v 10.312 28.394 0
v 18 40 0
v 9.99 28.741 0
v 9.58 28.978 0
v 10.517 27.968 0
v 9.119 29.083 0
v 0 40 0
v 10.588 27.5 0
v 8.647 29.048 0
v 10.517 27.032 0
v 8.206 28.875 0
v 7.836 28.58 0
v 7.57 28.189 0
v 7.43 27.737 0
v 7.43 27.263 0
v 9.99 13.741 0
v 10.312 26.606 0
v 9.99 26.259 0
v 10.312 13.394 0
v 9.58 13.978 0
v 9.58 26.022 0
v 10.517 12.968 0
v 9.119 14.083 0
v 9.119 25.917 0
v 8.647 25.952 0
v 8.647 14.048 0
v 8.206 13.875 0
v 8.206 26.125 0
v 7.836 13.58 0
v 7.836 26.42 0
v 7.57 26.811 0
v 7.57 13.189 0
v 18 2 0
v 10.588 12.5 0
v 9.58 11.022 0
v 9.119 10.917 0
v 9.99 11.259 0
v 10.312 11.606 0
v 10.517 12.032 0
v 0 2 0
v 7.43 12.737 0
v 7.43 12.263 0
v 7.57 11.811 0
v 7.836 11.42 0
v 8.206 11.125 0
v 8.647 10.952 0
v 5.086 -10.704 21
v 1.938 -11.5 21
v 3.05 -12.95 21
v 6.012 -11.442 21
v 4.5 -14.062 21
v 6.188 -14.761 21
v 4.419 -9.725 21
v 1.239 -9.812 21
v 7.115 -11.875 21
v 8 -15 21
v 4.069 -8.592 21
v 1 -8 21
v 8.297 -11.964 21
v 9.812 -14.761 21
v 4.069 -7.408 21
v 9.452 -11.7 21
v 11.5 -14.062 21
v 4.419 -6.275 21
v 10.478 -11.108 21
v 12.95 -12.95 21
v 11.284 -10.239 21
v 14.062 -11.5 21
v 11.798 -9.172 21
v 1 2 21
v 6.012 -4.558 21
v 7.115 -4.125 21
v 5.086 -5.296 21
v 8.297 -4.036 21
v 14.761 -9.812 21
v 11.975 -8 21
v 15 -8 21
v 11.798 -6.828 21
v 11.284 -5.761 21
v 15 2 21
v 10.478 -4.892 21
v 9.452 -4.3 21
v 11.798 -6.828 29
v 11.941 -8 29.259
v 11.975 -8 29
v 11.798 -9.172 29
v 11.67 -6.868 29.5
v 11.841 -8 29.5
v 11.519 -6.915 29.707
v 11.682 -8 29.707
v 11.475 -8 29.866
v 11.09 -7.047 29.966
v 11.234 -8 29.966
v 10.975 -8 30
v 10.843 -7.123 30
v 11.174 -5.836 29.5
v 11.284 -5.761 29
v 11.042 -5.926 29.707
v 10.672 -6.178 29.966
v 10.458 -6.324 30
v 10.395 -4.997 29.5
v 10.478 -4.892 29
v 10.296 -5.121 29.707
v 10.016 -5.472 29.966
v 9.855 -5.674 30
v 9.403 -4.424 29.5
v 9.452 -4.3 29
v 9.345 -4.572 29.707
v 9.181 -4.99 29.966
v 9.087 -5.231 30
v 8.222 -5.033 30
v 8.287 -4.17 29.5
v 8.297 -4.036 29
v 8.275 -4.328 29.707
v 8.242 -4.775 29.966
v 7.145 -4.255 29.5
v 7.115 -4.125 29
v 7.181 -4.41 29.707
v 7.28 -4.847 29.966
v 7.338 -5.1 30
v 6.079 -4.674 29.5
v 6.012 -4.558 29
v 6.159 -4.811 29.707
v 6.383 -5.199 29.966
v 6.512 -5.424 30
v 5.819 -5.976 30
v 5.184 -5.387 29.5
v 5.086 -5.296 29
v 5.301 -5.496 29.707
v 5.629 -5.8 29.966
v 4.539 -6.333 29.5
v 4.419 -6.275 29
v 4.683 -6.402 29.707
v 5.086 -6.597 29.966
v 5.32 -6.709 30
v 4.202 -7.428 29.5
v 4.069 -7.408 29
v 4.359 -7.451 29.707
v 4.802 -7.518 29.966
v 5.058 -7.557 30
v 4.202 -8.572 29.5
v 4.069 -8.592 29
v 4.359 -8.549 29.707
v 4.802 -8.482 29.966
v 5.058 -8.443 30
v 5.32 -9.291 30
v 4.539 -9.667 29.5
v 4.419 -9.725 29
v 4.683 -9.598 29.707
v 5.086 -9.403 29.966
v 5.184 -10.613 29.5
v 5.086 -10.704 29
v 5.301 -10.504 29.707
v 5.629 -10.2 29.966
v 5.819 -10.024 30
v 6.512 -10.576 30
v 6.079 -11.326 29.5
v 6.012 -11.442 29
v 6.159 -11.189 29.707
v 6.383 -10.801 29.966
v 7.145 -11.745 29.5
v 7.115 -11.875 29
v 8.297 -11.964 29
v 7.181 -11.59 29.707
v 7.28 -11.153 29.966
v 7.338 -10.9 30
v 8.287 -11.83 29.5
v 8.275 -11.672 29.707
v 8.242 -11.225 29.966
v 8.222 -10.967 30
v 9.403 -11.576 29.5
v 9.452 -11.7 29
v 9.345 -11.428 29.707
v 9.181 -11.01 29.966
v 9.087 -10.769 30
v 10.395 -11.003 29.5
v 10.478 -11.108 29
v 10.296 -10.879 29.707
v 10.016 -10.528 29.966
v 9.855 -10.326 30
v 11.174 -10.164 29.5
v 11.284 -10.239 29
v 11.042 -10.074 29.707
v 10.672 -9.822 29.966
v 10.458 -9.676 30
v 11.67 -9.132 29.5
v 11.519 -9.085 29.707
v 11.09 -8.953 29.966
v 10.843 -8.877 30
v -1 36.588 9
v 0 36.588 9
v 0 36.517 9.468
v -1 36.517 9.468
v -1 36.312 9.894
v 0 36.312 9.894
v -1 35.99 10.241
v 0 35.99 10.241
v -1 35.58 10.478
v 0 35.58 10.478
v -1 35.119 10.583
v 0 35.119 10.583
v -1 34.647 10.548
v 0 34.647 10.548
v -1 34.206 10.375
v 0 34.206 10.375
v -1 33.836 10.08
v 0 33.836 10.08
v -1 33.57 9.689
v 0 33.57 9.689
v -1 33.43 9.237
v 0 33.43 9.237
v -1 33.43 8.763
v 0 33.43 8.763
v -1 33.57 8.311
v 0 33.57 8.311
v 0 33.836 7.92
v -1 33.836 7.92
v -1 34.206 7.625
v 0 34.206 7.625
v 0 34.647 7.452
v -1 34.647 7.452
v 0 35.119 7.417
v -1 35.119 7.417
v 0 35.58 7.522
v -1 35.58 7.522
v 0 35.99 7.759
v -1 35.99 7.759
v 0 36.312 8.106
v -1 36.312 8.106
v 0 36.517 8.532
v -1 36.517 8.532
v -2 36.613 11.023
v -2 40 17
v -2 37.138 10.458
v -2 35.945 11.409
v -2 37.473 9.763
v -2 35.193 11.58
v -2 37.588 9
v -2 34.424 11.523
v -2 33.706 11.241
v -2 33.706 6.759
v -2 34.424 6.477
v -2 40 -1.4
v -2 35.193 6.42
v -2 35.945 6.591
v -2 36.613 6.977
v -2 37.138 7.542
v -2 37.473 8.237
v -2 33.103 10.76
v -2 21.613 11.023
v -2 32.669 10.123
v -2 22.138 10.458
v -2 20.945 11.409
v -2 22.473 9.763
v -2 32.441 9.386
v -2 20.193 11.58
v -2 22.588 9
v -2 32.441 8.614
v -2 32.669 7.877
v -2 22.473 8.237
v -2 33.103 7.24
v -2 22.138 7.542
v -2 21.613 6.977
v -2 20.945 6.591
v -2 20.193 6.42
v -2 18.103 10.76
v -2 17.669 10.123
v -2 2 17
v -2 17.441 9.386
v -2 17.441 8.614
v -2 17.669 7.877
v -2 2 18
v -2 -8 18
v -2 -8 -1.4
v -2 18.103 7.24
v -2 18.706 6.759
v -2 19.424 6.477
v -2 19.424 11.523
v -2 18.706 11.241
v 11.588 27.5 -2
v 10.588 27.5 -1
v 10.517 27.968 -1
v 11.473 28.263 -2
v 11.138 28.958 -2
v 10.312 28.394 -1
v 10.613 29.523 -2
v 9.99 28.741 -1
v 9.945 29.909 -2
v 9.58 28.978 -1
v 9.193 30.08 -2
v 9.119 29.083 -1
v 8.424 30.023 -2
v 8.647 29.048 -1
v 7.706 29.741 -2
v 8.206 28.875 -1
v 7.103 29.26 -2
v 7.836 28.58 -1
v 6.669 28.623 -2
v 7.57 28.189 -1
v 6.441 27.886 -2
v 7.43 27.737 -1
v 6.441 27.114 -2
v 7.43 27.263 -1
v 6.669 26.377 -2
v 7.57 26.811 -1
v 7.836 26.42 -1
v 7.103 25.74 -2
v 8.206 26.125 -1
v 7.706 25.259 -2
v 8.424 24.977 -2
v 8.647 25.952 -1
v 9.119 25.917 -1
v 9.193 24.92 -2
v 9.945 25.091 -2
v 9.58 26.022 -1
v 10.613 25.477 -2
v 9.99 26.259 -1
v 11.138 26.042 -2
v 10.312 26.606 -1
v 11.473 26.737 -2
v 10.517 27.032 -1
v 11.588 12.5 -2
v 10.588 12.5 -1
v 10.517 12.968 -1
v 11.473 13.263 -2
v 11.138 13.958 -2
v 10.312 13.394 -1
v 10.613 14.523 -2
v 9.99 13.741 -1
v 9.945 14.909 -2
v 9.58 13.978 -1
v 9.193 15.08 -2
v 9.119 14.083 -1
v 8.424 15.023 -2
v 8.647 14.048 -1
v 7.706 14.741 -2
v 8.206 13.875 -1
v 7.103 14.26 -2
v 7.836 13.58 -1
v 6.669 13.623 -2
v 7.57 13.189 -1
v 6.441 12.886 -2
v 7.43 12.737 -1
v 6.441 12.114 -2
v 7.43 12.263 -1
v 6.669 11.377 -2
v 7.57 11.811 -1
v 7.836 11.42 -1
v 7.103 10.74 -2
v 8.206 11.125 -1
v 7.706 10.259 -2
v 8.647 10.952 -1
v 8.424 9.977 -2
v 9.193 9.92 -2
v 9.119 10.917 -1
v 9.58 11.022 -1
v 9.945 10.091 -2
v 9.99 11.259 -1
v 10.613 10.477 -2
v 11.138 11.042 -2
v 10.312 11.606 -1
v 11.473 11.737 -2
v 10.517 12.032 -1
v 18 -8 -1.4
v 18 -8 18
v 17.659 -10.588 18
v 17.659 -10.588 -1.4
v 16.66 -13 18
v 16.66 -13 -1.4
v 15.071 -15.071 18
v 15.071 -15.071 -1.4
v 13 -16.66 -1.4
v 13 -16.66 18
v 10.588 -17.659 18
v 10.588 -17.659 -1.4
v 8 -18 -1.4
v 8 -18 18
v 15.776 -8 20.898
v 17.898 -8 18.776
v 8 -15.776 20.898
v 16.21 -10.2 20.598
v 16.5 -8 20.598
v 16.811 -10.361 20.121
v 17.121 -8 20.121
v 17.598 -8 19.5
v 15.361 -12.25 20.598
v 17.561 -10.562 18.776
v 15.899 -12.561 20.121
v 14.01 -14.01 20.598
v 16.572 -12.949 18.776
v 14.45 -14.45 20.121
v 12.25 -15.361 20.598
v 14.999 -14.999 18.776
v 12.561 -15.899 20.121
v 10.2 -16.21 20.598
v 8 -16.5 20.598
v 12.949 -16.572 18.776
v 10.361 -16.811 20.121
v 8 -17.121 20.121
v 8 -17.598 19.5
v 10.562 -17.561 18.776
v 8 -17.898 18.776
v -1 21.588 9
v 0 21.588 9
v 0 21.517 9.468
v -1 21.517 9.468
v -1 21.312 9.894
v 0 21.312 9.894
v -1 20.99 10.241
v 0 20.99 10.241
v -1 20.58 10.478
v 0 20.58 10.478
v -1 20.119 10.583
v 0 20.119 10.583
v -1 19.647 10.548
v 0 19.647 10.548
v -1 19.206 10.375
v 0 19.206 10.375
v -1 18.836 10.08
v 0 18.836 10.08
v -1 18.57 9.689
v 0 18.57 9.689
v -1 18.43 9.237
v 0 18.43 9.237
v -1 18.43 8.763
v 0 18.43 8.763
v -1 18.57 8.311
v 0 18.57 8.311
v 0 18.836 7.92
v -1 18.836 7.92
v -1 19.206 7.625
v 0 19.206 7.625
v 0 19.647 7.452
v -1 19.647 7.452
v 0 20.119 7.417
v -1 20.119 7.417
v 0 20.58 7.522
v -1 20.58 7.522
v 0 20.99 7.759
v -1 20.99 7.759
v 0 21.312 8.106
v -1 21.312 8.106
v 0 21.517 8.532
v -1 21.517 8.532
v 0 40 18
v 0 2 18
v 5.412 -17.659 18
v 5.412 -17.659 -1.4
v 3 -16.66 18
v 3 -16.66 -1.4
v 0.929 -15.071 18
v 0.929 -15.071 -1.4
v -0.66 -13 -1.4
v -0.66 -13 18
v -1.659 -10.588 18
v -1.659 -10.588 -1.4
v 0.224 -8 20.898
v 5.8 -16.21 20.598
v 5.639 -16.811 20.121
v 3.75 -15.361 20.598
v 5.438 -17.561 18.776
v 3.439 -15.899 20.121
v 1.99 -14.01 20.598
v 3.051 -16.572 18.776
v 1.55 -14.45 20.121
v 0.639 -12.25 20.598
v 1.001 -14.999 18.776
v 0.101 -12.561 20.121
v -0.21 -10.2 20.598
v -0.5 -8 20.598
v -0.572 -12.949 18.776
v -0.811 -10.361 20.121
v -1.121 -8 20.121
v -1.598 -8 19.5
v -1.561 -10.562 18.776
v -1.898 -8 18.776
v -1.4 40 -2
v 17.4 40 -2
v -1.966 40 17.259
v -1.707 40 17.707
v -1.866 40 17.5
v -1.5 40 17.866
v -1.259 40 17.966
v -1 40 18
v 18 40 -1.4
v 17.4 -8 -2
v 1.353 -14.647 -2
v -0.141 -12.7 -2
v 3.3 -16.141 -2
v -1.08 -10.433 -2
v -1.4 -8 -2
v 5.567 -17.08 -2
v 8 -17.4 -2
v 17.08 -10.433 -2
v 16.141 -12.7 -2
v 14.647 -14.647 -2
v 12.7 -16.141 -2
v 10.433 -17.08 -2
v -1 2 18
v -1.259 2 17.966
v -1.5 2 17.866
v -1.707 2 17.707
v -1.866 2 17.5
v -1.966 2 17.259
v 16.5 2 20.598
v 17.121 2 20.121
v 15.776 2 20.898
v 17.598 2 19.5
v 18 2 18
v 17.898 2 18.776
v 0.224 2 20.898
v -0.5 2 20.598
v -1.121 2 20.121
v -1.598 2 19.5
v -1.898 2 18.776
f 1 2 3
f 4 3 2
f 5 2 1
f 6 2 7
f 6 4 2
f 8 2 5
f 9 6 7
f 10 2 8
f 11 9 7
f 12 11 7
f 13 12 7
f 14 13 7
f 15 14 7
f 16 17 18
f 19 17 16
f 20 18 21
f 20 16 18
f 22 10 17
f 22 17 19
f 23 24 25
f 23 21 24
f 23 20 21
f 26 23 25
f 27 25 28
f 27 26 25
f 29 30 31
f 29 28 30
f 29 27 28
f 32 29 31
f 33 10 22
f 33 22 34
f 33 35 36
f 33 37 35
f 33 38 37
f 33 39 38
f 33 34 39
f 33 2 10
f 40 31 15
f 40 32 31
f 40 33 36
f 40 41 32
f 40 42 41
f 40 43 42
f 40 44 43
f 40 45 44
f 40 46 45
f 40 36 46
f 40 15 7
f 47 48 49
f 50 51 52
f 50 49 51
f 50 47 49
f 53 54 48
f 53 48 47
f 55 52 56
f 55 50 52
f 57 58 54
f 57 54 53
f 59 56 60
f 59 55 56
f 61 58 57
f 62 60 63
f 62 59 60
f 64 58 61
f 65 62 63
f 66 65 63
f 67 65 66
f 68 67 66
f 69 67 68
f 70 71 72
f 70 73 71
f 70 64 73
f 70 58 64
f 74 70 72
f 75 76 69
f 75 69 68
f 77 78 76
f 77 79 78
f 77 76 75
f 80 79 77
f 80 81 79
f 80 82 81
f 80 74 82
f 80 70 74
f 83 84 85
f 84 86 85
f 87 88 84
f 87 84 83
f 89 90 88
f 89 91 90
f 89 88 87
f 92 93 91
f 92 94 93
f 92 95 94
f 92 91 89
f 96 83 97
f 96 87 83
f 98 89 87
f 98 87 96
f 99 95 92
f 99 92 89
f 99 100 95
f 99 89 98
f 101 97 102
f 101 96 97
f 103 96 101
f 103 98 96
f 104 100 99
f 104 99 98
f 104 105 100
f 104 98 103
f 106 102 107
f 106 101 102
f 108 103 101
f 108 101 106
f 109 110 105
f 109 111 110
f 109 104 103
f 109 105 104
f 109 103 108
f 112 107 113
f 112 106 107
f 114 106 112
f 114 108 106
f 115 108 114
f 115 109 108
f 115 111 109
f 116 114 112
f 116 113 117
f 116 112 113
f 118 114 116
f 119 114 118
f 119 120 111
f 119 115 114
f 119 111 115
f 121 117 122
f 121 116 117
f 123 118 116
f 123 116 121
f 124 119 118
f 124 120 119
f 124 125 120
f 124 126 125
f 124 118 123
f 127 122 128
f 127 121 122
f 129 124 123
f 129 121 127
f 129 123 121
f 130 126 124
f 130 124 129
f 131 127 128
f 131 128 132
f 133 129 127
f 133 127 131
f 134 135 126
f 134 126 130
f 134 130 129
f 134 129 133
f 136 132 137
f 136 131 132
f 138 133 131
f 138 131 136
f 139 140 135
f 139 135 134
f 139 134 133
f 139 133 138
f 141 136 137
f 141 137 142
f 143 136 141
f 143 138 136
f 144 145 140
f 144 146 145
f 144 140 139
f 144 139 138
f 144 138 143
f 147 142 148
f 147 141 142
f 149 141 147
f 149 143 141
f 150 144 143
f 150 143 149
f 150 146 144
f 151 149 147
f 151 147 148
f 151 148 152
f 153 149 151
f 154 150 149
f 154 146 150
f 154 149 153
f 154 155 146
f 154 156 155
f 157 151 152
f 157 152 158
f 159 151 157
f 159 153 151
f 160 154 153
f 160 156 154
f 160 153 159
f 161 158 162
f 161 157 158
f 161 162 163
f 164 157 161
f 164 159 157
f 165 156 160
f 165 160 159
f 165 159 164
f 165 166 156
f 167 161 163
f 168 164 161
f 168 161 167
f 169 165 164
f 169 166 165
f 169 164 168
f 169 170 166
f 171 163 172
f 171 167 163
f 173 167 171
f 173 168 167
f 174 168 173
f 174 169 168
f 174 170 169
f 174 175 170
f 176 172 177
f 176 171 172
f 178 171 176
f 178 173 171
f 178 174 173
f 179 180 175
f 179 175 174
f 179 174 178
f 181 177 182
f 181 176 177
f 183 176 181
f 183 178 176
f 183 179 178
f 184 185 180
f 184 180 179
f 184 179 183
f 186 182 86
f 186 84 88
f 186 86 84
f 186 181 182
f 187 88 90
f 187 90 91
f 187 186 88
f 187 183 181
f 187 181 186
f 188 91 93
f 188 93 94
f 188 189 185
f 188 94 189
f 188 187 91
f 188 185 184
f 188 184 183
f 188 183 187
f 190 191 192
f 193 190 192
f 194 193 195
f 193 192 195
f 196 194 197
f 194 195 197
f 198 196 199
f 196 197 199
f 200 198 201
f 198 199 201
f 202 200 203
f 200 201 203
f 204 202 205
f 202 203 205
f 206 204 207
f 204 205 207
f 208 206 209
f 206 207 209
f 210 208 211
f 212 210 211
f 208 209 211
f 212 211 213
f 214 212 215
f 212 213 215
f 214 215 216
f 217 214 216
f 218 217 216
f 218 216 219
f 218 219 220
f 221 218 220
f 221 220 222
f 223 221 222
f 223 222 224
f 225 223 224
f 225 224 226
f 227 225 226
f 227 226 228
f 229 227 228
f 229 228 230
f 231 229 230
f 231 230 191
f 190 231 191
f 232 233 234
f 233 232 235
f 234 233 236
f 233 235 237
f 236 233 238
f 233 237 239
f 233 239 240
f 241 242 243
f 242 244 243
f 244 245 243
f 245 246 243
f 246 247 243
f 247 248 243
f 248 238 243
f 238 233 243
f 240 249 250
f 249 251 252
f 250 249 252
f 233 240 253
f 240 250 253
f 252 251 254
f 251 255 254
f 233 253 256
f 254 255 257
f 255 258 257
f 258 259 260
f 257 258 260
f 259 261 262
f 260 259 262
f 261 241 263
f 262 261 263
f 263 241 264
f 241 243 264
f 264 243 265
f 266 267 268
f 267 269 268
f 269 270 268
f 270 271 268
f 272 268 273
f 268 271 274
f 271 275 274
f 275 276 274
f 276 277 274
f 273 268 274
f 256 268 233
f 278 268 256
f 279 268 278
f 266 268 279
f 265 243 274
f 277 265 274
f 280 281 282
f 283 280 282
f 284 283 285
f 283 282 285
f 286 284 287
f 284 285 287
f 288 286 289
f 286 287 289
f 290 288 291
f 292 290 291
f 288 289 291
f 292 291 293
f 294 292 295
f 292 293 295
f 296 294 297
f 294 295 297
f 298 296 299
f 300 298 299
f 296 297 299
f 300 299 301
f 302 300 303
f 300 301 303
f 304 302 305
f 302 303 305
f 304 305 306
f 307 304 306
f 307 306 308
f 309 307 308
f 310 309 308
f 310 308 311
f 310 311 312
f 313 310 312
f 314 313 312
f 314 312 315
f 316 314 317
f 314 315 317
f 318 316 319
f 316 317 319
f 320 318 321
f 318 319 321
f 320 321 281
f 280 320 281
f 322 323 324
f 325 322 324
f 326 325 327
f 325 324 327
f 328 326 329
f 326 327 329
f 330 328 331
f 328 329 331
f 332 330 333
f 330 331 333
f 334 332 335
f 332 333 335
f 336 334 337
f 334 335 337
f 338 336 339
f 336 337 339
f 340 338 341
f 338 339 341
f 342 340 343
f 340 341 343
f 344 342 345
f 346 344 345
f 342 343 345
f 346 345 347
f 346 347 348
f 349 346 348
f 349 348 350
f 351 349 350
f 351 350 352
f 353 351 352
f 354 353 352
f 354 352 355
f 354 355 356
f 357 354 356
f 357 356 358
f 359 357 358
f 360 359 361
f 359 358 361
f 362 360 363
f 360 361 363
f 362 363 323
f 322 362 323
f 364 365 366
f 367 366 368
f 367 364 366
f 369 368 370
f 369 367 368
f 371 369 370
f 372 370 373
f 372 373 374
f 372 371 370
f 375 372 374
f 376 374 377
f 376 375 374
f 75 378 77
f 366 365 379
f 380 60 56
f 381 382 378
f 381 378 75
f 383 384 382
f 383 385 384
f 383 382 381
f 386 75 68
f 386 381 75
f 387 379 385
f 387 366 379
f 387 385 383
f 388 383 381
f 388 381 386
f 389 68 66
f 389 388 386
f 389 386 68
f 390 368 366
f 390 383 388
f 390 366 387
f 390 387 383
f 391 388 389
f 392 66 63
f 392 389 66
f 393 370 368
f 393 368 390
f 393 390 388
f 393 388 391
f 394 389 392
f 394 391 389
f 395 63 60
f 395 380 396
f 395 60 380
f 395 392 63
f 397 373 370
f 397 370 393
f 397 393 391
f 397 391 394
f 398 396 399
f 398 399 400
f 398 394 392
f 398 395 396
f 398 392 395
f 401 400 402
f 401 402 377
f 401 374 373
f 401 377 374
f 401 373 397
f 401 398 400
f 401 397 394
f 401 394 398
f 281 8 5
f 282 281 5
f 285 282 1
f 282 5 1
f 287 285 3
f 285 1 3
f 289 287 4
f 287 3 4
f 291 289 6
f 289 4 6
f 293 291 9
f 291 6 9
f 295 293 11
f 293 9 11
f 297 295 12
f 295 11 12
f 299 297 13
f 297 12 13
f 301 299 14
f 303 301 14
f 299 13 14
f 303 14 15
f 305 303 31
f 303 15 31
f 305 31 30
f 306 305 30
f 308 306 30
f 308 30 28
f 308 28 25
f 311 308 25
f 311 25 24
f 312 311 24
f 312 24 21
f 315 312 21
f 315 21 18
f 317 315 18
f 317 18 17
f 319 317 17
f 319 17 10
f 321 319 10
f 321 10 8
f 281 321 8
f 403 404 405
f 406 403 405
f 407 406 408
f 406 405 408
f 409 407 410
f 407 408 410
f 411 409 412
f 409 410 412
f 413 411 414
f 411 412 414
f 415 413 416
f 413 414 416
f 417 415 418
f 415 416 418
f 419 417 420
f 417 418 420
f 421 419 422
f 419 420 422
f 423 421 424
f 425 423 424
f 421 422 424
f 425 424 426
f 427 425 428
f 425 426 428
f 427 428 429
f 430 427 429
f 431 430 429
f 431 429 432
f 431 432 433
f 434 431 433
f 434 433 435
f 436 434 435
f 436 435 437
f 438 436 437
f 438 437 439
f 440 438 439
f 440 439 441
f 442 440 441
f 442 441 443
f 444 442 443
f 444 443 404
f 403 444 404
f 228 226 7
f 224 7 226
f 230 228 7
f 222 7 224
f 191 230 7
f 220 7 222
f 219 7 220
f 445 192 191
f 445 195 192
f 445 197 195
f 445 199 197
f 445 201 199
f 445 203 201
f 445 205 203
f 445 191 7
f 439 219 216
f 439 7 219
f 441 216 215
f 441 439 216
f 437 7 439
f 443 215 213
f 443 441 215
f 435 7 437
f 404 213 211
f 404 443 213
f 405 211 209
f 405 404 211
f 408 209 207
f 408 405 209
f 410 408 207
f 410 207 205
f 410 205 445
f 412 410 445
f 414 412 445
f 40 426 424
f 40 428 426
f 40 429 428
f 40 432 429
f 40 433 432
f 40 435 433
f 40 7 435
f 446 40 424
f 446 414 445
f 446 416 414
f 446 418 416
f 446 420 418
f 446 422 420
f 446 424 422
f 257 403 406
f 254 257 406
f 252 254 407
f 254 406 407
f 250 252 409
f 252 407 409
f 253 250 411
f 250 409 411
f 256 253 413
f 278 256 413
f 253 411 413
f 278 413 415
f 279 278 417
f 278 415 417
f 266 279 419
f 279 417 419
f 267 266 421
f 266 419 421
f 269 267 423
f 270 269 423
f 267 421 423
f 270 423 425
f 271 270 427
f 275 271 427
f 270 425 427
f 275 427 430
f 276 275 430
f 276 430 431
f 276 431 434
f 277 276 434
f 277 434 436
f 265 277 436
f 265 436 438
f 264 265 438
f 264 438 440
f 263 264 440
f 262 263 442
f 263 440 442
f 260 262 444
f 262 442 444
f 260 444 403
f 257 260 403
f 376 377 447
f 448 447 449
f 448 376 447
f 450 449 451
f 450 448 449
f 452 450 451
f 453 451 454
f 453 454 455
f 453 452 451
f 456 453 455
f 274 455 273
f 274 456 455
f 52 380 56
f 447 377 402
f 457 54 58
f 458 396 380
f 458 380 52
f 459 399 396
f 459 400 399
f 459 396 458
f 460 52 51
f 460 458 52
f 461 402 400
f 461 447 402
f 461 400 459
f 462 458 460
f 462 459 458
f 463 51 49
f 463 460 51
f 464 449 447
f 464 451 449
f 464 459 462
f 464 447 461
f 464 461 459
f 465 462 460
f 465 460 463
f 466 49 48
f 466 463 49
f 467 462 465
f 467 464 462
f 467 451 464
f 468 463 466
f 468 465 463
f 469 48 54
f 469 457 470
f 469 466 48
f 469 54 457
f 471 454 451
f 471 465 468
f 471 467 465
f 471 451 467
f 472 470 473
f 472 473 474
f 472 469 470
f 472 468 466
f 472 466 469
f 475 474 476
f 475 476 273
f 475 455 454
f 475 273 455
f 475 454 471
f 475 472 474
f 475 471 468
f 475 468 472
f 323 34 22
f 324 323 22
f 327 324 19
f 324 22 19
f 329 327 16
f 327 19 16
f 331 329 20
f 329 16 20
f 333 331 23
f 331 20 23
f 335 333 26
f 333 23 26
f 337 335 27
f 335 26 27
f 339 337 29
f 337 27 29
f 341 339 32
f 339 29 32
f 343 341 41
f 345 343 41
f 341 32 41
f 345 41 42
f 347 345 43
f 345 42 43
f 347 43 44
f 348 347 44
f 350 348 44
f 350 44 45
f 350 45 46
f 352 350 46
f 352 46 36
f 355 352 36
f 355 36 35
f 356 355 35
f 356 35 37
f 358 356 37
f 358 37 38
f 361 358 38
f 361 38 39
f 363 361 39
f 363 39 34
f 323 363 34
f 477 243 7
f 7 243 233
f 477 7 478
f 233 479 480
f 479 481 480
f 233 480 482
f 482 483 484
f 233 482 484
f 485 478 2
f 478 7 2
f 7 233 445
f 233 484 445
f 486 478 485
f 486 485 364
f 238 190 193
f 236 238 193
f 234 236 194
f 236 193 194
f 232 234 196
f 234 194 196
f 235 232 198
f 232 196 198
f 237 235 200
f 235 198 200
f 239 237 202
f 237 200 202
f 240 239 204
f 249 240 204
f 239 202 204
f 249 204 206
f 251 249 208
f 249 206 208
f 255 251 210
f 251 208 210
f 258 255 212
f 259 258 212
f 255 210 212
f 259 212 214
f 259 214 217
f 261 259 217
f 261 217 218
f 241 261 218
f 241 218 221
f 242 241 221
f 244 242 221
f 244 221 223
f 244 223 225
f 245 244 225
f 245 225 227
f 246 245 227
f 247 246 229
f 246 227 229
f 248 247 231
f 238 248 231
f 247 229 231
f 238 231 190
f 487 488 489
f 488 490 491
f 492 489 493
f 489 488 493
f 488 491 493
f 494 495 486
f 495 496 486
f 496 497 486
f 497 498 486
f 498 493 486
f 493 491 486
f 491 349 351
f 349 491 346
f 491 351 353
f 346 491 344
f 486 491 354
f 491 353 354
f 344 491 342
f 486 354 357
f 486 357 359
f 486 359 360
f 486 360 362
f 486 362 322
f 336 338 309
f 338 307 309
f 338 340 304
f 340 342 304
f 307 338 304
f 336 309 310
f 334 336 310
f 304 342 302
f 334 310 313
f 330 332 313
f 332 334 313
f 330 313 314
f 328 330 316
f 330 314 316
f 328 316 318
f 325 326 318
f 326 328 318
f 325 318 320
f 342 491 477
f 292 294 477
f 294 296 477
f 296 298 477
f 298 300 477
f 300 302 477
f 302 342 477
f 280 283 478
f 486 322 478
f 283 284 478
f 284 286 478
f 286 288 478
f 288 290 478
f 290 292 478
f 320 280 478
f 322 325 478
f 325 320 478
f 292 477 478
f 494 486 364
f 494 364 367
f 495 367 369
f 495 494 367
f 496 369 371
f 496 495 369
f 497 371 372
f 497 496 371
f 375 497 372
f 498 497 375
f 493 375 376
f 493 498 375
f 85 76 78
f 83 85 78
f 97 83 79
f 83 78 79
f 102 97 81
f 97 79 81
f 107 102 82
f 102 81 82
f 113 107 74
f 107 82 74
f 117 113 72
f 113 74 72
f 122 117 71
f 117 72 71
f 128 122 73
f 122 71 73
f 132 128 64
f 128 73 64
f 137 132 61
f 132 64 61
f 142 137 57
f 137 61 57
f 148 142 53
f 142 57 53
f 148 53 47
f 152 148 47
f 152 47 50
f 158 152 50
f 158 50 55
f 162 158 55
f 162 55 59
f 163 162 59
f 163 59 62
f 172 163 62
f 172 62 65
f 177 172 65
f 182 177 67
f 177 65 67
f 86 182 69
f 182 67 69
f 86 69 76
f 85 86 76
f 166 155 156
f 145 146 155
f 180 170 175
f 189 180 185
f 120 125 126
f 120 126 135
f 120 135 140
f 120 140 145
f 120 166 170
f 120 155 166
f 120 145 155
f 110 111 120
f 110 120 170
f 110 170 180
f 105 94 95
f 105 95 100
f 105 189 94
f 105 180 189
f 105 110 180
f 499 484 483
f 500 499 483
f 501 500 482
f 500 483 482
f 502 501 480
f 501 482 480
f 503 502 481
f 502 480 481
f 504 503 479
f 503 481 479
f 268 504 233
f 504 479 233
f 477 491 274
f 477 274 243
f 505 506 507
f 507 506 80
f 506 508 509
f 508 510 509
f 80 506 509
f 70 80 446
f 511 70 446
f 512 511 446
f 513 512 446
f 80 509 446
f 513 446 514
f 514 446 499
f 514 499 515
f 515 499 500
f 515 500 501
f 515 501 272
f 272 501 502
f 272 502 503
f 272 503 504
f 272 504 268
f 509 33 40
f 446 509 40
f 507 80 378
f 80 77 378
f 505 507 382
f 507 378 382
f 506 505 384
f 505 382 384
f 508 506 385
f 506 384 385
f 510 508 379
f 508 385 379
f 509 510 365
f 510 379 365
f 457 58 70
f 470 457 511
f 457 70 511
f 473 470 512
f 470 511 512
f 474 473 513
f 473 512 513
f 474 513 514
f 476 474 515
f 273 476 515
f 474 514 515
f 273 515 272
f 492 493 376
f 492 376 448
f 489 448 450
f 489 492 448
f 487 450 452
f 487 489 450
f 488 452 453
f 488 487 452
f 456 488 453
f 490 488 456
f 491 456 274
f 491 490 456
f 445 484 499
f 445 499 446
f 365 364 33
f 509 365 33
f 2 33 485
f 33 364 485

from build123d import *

# Parameters (mm, degrees)
F1_DEPTH     = 40
F2_W         = 2
F2_H         = 18
F3_DEPTH     = 18
F4_R         = 1.5875
F5_DEPTH     = 2.001
F6_R         = 1.5875
F7_DEPTH     = 2.001
F8_SIZE      = 1
F9_W         = 20
F9_H         = 18
F10_DEPTH    = 20
F12_DEPTH    = 3
F13_R        = 3.975
F14_DEPTH    = 9
F15_R        = 1
F16_R        = 9.99999
F17_R        = 3
F18_T1_DEPTH = 40.5
F19_SIZE     = 0.6


# Not quite as in the source:
# - a fillet or chamfer that OpenCascade refuses, or shapes differently, is made with other operations: its cross-section is extruded or revolved along the edge and cut away or added
# - a fillet or chamfer is up to 0.001 mm smaller than in the source, because OpenCascade refuses the exact size


with BuildPart() as f1:
    # F0 (on Front) → F1 (new body)
    with BuildSketch(Plane.XZ):
        Polygon((-2, 18), (-2, -2), (18, -2), (18, 0), (0, 0), (0, 18), align=None)
    extrude(amount=-F1_DEPTH)

    # F2 (on face) → F3 (join, through all)
    with BuildSketch(Plane.YZ):
        with Locations((1, 9)):
            Rectangle(F2_W, F2_H)
    extrude(amount=F3_DEPTH)

    # F4 (on face) → F5 (cut, through all)
    with BuildSketch(Plane.XY):
        with Locations((9, 12.5)):
            Circle(F4_R)
        with Locations((9, 27.5)):
            Circle(F4_R)
    extrude(amount=-F5_DEPTH, mode=Mode.SUBTRACT)

    # F6 (on face) → F7 (cut, through all)
    with BuildSketch(Plane.YZ):
        with Locations((35, 9)):
            Circle(F6_R)
        with Locations((20, 9)):
            Circle(F6_R)
    extrude(amount=-F7_DEPTH, mode=Mode.SUBTRACT)

    # F8
    f8_edges = [f1.edges().sort_by_distance(p)[0] for p in [
        (-2, 18.4125, 9),
        (-2, 33.4125, 9),
        (7.4125, 27.5, -2),
        (7.4125, 12.5, -2),
    ]]
    chamfer(f8_edges, length=F8_SIZE)

    # F9 (on face) → F10 (join, through all)
    with BuildSketch(Plane.XY.offset(18)):
        with Locations((8, -9)):
            Rectangle(F9_W, F9_H)
    extrude(amount=-F10_DEPTH)

    # F11 (on face) → F12 (join)
    with BuildSketch(Plane.XY.offset(18)):
        Polygon((18, -18), (18, 2), (0, 2), (-2, 2), (-2, -18), align=None)
    extrude(amount=F12_DEPTH)

    # F13 (on face) → F14 (join)
    with BuildSketch(Plane.XY.offset(21)):
        with Locations((8, -8)):
            Circle(F13_R)
    extrude(amount=F14_DEPTH)

    # F15
    f15_edges = [f1.edges().sort_by_distance(p)[0] for p in [
        (4.025, -8, 30),
    ]]
    fillet(f15_edges, radius=F15_R)

    # F16 (radius 10 in the source; OpenCascade refuses exactly that, so slightly less here)
    f16_edges = [f1.edges().sort_by_distance(p)[0] for p in [
        (-2, -18, 9.5),
        (18, -18, 9.5),
    ]]
    fillet(f16_edges, radius=F16_R)

    # F17
    f17_edges = [f1.edges().sort_by_distance(p)[0] for p in [
        (0.928929, -15.071071, 21),
        (-2, -3.000005, 21),
        (18, -3.000005, 21),
        (15.071071, -15.071071, 21),
        (8, -18, 21),
    ]]
    fillet(f17_edges, radius=F17_R)

    # F18: fillet of radius 1 on 1 edges, made by hand

    # F18_s2 → F18_t1 (cut)
    with BuildSketch(Plane.XZ.offset(-42.5)):
        with BuildLine():
            ThreePointArc((-1, 18), (-1.7071067812, 17.7071067812), (-2, 17))
            Line((-2, 17), (-2, 18))
            Line((-2, 18), (-1, 18))
        make_face()
    extrude(amount=F18_T1_DEPTH, mode=Mode.SUBTRACT)

    # F19
    f19_edges = [f1.edges().sort_by_distance(p)[0] for p in [
        (18, 15.999995, -2),
        (-2, 15.999995, -2),
        (0.928929, -15.071071, -2),
        (15.071071, -15.071071, -2),
        (8, -18, -2),
    ]]
    chamfer(f19_edges, length=F19_SIZE)


solid = f1.part
